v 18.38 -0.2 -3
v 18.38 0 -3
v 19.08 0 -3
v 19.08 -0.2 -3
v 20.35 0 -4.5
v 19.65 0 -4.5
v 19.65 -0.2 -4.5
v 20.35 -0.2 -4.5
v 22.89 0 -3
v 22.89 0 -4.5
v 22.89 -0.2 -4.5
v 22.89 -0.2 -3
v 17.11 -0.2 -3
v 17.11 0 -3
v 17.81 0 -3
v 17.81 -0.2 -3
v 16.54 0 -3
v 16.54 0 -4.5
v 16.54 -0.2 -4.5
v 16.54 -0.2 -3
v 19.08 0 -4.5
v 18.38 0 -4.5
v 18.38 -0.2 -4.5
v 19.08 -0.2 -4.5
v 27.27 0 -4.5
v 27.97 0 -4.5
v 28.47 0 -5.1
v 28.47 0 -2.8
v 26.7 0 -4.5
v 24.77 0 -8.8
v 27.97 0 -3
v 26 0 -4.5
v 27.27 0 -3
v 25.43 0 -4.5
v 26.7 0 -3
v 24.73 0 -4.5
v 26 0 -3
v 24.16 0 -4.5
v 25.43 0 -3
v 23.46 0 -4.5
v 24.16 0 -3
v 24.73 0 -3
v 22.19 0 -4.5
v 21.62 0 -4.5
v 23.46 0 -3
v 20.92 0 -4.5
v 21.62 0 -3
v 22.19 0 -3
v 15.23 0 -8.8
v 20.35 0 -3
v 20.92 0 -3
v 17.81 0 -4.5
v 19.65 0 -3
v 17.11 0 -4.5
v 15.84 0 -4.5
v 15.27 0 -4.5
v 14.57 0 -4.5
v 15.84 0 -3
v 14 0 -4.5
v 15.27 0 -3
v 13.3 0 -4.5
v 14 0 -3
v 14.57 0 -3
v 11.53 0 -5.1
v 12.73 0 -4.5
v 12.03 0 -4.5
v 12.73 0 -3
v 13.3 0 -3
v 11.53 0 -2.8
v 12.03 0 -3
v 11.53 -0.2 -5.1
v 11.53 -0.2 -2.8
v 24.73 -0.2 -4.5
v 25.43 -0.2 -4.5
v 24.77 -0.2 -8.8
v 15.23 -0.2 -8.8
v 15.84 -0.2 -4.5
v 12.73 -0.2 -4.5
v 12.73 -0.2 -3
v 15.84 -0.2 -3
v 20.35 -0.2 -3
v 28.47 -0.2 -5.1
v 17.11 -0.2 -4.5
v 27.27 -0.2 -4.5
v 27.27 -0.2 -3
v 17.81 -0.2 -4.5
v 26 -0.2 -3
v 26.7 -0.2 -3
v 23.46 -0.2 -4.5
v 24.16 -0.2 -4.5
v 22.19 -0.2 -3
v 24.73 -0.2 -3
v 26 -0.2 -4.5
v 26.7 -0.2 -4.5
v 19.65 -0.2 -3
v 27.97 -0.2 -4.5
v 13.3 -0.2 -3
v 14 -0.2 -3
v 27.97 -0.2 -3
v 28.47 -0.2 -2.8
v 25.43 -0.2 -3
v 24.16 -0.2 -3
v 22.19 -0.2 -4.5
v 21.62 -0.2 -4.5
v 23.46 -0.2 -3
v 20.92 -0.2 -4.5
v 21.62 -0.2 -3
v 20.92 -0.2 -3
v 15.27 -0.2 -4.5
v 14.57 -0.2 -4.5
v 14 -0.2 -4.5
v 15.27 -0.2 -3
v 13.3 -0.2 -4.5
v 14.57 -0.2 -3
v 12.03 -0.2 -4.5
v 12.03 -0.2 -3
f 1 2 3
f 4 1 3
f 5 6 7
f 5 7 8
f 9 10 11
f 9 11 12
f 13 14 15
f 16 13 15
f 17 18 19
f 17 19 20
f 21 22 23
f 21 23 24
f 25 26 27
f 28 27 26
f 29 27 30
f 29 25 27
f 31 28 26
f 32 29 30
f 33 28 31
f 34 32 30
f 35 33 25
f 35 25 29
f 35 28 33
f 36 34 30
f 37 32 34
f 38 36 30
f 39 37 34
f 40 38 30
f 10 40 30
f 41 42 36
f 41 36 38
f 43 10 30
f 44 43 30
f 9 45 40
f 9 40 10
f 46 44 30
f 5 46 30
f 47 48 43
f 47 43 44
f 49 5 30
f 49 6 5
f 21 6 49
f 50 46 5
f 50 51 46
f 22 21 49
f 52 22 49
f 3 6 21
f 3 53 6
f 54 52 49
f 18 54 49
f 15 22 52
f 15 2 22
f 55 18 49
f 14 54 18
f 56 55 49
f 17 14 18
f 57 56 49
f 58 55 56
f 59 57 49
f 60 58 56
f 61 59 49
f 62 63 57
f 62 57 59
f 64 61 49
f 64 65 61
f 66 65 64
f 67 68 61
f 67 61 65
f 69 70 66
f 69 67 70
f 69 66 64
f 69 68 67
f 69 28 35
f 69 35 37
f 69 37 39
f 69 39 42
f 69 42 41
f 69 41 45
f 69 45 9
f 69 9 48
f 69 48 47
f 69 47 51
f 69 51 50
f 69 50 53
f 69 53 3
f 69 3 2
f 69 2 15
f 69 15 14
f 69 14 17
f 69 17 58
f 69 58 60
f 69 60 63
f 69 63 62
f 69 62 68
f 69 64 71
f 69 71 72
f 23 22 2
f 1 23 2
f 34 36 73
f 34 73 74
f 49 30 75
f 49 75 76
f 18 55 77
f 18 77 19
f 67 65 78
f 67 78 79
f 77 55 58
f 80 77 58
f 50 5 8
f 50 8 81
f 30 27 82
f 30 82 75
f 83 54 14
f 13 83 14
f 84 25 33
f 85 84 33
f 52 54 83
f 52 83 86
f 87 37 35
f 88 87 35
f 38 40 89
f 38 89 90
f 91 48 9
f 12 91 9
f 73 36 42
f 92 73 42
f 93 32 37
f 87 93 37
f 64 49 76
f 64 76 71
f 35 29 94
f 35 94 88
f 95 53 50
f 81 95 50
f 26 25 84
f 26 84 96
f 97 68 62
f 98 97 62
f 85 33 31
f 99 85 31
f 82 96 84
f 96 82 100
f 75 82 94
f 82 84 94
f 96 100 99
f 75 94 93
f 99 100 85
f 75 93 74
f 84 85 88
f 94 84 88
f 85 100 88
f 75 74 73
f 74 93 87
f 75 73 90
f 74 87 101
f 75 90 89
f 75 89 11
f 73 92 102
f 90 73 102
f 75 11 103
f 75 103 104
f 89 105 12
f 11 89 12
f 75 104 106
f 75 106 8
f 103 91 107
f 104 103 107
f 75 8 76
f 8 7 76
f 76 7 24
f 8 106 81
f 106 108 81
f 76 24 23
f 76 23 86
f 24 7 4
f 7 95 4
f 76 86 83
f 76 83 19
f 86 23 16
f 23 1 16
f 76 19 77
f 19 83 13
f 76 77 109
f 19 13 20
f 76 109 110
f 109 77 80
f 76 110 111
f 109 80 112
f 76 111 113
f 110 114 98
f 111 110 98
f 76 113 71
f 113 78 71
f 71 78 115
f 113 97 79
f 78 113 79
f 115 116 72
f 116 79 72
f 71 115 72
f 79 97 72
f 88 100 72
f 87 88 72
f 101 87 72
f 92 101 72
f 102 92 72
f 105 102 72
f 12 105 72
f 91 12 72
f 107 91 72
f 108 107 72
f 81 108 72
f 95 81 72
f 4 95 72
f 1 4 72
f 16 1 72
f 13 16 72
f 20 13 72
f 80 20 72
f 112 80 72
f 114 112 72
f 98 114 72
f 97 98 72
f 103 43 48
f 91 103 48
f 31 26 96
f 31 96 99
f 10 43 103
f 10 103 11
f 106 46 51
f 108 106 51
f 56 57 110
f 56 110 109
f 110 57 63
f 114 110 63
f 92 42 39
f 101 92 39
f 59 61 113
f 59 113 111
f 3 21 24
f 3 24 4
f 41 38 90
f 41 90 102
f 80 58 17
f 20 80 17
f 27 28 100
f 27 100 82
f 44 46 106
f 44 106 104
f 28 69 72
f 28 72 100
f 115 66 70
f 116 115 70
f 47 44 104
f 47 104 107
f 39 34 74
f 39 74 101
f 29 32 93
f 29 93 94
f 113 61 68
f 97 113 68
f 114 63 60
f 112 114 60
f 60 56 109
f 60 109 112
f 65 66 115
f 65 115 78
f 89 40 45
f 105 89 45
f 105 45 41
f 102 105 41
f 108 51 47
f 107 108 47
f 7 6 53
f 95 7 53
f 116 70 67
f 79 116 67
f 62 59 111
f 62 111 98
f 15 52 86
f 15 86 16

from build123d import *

# Parameters (mm, degrees)
SKETCH_1_W      = 0.7
SKETCH_1_H      = 1.5
EXTRUDE_1_DEPTH = 0.2


with BuildPart() as part:
    # 스케치1 → 보스-돌출1 (new body)
    with BuildSketch(Plane.XZ):
        Polygon((28.47, -5.1), (24.77, -8.8), (15.23, -8.8), (11.53, -5.1), (11.53, -2.8), (28.47, -2.8), align=None)
        with Locations((12.38, -3.75)):
            Rectangle(SKETCH_1_W, SKETCH_1_H, mode=Mode.SUBTRACT)
        with Locations((13.65, -3.75)):
            Rectangle(SKETCH_1_W, SKETCH_1_H, mode=Mode.SUBTRACT)
        with Locations((14.92, -3.75)):
            Rectangle(SKETCH_1_W, SKETCH_1_H, mode=Mode.SUBTRACT)
        with Locations((16.19, -3.75)):
            Rectangle(SKETCH_1_W, SKETCH_1_H, mode=Mode.SUBTRACT)
        with Locations((17.46, -3.75)):
            Rectangle(SKETCH_1_W, SKETCH_1_H, mode=Mode.SUBTRACT)
        with Locations((18.73, -3.75)):
            Rectangle(SKETCH_1_W, SKETCH_1_H, mode=Mode.SUBTRACT)
        with Locations((20, -3.75)):
            Rectangle(SKETCH_1_W, SKETCH_1_H, mode=Mode.SUBTRACT)
        with Locations((21.27, -3.75)):
            Rectangle(SKETCH_1_W, SKETCH_1_H, mode=Mode.SUBTRACT)
        with Locations((22.54, -3.75)):
            Rectangle(SKETCH_1_W, SKETCH_1_H, mode=Mode.SUBTRACT)
        with Locations((23.81, -3.75)):
            Rectangle(SKETCH_1_W, SKETCH_1_H, mode=Mode.SUBTRACT)
        with Locations((25.08, -3.75)):
            Rectangle(SKETCH_1_W, SKETCH_1_H, mode=Mode.SUBTRACT)
        with Locations((26.35, -3.75)):
            Rectangle(SKETCH_1_W, SKETCH_1_H, mode=Mode.SUBTRACT)
        with Locations((27.62, -3.75)):
            Rectangle(SKETCH_1_W, SKETCH_1_H, mode=Mode.SUBTRACT)
    extrude(amount=EXTRUDE_1_DEPTH)


solid = part.part
